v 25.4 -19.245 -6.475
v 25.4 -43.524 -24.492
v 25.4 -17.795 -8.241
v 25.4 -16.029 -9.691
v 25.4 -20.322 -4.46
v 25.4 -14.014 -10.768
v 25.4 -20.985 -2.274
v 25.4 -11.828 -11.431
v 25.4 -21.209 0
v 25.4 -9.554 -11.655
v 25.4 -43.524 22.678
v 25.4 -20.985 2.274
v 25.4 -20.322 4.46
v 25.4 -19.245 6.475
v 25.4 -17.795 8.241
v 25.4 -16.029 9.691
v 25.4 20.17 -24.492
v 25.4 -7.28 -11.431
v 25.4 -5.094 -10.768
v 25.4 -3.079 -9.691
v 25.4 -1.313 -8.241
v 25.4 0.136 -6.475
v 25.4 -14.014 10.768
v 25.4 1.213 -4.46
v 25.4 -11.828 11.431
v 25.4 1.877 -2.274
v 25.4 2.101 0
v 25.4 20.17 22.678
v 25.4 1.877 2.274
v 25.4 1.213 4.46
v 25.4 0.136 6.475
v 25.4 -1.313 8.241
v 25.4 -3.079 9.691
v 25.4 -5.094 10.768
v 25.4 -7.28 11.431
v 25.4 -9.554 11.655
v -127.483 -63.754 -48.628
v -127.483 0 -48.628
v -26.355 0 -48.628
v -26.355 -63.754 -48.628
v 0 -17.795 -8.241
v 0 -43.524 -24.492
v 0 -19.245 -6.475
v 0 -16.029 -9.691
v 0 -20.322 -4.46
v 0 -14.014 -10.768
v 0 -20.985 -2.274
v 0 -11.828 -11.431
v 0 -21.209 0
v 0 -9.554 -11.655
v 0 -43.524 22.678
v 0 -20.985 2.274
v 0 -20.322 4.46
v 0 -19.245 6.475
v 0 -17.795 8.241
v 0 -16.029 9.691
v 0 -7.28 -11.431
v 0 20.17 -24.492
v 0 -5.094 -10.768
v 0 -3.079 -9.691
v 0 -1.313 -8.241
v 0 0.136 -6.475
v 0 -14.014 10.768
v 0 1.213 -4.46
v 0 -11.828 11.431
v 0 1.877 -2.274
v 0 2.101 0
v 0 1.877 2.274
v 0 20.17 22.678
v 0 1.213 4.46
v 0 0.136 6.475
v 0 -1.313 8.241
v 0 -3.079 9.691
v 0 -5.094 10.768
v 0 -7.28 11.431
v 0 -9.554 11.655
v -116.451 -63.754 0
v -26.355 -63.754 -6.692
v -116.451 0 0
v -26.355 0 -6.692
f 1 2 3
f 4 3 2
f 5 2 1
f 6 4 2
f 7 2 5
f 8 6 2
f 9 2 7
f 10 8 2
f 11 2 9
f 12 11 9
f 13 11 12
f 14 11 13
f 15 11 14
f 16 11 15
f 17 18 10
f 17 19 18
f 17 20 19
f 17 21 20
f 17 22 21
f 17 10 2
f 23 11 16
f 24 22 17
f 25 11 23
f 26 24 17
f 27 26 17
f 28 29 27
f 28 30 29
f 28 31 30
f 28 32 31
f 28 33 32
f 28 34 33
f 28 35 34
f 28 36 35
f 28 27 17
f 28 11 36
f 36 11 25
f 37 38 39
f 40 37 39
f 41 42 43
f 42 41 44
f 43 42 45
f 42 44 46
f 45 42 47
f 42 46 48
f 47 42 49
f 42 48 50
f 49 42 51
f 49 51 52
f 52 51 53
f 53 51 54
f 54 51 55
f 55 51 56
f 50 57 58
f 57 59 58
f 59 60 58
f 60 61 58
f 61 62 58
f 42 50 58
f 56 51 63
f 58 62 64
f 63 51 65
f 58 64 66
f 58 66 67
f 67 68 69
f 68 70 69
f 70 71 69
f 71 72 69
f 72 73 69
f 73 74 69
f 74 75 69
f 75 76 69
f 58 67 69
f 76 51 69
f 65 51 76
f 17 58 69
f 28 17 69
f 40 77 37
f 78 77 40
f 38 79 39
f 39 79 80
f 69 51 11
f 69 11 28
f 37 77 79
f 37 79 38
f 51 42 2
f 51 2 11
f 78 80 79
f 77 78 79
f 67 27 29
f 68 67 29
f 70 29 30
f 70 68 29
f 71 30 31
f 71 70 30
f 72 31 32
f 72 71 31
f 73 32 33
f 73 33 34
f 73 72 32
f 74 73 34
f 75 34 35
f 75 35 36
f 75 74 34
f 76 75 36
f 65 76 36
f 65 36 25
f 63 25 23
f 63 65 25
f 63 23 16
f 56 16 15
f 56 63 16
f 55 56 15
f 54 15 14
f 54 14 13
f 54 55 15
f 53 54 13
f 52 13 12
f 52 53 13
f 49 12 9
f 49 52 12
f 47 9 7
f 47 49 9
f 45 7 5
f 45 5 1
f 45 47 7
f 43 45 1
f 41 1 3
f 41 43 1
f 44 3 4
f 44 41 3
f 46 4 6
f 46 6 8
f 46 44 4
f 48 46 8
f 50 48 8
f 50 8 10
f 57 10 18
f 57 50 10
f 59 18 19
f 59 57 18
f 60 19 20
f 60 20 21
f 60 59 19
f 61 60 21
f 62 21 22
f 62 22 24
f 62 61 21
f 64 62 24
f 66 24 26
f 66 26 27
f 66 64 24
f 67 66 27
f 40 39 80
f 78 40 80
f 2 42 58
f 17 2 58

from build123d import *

# Parameters (mm, degrees)
F0_W     = 63.694341
F0_H     = 47.169637
F0_R     = 11.654765
F2_DEPTH = 25.4
F3_DEPTH = 63.754


with BuildPart() as f2:
    # F0 (on Right) → F2 (new body)
    with BuildSketch(Plane.YZ):
        with Locations((-11.677292, -0.906726)):
            Rectangle(F0_W, F0_H)
        with Locations((-9.554155, 0)):
            Circle(F0_R, mode=Mode.SUBTRACT)
    extrude(amount=F2_DEPTH)


with BuildPart() as f3:
    # F1 (on Front) → F3 (new body)
    with BuildSketch(Plane.XZ):
        Polygon((-26.354654, -6.692067), (-116.450801, 0), (-127.482966, -48.628237), (-26.354654, -48.628237), align=None)
    extrude(amount=F3_DEPTH)


solid = Compound([f2.part, f3.part])
